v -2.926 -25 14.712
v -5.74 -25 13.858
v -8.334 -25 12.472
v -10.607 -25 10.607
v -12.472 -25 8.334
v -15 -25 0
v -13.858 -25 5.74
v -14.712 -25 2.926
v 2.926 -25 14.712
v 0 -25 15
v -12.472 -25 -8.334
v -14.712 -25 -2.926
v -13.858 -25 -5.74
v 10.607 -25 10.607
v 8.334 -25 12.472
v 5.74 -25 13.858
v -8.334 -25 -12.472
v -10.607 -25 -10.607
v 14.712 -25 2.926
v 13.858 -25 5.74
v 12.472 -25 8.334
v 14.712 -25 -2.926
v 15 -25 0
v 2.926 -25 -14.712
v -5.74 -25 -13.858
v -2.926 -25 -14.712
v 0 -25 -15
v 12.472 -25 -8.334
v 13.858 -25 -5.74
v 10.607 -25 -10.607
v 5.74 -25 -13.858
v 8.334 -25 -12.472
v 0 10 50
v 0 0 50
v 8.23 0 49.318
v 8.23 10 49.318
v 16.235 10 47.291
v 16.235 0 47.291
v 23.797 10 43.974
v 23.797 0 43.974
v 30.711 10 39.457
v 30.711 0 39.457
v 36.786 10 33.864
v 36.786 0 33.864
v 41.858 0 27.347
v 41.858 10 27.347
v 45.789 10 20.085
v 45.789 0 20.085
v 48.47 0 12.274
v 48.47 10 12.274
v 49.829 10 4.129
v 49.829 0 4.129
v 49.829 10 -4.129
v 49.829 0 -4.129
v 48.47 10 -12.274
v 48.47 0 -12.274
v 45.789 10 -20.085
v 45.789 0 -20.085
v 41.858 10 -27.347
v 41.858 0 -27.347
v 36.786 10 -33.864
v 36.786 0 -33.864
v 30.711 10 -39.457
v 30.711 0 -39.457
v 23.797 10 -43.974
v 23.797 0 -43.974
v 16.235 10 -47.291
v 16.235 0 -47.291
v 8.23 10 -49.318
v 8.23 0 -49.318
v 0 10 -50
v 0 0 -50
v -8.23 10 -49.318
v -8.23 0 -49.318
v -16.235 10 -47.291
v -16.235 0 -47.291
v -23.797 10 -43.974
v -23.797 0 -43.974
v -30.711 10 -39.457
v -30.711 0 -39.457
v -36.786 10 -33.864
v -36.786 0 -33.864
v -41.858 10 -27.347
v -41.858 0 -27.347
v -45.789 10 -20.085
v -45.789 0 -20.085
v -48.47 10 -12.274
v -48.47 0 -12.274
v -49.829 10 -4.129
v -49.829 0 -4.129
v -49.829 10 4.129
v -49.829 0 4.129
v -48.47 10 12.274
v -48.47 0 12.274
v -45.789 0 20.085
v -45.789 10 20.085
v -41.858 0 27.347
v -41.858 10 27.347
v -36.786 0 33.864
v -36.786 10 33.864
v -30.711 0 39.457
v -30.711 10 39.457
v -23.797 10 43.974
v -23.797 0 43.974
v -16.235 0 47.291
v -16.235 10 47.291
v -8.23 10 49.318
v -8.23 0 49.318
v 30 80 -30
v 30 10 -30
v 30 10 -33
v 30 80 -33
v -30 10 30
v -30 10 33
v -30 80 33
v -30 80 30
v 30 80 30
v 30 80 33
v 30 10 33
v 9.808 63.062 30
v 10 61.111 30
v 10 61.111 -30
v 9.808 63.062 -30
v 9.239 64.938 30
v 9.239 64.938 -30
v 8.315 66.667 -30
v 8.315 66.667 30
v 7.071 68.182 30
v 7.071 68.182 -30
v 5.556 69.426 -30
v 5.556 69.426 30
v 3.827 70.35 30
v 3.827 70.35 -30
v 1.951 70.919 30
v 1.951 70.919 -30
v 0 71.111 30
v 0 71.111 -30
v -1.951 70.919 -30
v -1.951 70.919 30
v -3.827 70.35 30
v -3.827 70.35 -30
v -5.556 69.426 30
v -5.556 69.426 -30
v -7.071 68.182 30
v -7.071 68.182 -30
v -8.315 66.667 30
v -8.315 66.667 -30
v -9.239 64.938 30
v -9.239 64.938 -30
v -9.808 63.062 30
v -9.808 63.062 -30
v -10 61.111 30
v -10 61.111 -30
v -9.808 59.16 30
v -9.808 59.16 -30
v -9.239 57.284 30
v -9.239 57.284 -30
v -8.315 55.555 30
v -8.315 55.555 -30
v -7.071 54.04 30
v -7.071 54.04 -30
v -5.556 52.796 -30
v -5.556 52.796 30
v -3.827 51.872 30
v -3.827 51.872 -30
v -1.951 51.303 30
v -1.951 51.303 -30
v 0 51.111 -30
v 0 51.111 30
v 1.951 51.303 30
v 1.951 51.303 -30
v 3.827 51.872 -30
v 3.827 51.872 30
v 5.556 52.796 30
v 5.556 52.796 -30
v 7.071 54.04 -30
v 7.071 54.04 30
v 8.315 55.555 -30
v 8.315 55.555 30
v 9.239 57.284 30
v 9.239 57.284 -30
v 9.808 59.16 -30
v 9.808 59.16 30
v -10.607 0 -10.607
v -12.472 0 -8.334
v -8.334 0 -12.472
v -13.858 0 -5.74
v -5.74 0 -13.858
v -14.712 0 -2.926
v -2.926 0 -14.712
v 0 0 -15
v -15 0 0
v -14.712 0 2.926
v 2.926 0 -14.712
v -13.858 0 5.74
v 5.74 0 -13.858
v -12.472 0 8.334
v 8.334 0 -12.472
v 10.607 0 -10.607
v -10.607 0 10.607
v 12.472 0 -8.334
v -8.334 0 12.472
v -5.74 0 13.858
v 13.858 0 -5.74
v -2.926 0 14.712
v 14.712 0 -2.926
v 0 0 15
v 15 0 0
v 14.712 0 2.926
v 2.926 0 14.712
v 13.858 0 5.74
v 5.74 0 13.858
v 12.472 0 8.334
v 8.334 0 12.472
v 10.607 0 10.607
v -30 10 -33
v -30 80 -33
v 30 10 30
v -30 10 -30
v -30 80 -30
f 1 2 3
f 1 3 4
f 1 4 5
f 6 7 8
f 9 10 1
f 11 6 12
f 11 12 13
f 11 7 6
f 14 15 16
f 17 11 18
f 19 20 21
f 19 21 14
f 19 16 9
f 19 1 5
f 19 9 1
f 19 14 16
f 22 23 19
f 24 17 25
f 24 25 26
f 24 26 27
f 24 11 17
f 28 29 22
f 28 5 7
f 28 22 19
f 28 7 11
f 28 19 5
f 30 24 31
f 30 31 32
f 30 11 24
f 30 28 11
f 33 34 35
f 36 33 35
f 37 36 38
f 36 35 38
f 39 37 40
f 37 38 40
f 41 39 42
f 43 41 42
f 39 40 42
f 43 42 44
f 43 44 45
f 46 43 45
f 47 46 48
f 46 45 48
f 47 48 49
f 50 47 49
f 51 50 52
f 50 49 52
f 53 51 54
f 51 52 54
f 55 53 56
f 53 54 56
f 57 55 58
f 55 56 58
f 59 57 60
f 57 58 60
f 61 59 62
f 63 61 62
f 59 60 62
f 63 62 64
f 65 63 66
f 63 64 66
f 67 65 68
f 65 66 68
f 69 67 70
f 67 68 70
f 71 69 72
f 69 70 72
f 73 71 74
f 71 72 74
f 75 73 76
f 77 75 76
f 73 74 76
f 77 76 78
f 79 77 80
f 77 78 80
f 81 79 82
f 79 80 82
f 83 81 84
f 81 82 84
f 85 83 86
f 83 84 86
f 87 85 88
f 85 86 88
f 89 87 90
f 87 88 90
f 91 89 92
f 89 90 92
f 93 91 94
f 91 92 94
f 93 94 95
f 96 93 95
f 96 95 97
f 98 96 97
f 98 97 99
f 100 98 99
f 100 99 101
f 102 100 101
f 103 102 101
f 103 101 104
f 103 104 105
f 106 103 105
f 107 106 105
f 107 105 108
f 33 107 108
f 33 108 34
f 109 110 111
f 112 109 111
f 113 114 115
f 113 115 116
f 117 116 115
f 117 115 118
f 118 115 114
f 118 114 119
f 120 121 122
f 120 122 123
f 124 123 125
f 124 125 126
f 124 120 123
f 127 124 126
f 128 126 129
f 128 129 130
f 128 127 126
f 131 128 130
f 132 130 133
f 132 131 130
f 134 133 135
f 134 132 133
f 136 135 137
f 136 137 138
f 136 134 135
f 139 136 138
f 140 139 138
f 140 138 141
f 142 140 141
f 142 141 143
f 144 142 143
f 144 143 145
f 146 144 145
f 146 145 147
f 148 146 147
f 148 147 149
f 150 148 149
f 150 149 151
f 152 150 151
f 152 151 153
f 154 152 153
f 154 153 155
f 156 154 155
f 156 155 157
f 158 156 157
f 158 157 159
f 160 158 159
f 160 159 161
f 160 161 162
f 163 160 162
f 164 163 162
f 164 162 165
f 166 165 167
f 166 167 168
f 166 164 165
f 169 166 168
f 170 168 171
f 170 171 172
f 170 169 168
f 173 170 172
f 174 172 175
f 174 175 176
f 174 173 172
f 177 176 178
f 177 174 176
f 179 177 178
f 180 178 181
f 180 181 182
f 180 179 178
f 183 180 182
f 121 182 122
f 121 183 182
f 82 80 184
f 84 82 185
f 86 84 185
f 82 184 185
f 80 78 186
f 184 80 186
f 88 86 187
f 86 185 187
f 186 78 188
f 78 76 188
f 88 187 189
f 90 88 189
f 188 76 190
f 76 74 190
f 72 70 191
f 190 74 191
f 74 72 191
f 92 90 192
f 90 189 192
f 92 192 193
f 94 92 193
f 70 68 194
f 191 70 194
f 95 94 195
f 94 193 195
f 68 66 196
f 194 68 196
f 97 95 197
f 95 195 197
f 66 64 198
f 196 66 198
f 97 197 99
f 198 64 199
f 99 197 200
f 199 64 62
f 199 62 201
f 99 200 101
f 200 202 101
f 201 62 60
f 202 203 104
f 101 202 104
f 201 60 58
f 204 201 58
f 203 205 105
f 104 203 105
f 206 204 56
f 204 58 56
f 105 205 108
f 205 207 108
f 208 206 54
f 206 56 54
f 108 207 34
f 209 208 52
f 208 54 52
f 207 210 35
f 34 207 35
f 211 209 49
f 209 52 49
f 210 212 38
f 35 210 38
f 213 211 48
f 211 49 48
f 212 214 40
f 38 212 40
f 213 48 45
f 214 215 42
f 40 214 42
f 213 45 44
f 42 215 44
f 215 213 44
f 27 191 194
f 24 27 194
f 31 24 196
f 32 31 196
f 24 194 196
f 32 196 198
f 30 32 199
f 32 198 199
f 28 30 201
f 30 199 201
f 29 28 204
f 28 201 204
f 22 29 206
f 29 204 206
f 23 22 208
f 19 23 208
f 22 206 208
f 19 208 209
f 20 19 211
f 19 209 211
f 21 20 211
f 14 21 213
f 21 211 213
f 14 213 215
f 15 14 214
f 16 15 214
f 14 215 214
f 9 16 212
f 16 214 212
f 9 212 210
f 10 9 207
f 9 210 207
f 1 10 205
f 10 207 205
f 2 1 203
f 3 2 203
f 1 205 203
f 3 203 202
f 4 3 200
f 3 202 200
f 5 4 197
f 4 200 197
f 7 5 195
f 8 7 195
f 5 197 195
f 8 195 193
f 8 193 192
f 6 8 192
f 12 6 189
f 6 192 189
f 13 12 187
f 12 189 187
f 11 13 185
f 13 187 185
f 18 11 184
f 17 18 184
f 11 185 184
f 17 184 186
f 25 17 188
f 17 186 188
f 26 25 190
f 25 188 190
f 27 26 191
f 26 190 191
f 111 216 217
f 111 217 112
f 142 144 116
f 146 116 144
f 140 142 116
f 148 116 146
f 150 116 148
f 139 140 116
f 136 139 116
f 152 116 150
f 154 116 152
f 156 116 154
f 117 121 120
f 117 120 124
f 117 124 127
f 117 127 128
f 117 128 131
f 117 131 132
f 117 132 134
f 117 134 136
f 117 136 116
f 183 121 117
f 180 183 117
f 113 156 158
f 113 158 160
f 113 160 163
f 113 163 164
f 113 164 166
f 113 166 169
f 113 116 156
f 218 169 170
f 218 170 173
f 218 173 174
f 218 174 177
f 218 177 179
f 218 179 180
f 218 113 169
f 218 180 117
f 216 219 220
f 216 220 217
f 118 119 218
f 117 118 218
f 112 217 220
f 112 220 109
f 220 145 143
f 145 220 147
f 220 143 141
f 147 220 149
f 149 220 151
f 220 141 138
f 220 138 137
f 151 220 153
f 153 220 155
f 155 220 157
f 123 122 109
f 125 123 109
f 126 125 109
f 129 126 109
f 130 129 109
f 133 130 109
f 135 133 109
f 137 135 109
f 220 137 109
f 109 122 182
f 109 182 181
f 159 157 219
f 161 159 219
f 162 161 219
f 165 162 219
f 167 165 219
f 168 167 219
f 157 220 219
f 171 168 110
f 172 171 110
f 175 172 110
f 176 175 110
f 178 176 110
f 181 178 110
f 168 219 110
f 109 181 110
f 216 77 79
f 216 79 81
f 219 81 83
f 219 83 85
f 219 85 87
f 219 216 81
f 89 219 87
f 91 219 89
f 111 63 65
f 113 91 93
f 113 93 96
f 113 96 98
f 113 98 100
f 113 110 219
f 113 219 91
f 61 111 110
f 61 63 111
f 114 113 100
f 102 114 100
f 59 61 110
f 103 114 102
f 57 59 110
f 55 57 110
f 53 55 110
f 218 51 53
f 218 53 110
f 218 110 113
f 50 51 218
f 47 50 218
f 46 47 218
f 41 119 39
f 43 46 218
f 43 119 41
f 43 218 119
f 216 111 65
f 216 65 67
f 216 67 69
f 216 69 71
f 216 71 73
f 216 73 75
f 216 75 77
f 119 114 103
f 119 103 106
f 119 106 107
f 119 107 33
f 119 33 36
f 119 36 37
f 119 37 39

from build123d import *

# Parameters (mm, degrees)
SKETCH1_R           = 50
BOSS_EXTRUDE1_DEPTH = 10
SKETCH2_R           = 15
BOSS_EXTRUDE2_DEPTH = 25
SKETCH3_W           = 60
SKETCH3_H           = 3
BOSS_EXTRUDE3_DEPTH = 70
SKETCH4_R           = 10
BOSS_EXTRUDE4_DEPTH = 63


with BuildPart() as part:
    # Sketch1 → Boss-Extrude1 (new body)
    with BuildSketch(Plane(origin=(0, 0, 0), x_dir=(1, 0, 0), z_dir=(0, 1, 0))):
        with Locations(Location((0, 0, 0), (0, 0, 270))):
            Circle(SKETCH1_R)
    extrude(amount=BOSS_EXTRUDE1_DEPTH)

    # Sketch2 → Boss-Extrude2 (add)
    with BuildSketch(Plane(origin=(0, 0, 0), x_dir=(-1, 0, 0), z_dir=(0, -1, 0))):
        with Locations(Location((0, 0, 0), (0, 0, 90))):
            Circle(SKETCH2_R)
    extrude(amount=BOSS_EXTRUDE2_DEPTH)

    # Sketch3 → Boss-Extrude3 (add)
    with BuildSketch(Plane(origin=(0, 10, 0), x_dir=(1, 0, 0), z_dir=(0, 1, 0))):
        with Locations((0, -31.5)):
            Rectangle(SKETCH3_W, SKETCH3_H)
        with Locations((0, 31.5)):
            Rectangle(SKETCH3_W, SKETCH3_H)
    extrude(amount=BOSS_EXTRUDE3_DEPTH)

    # Sketch4 → Boss-Extrude4 (add)
    with BuildSketch(Plane.XY.offset(33)):
        with Locations((0, 61.110810205)):
            Circle(SKETCH4_R)
    extrude(amount=-BOSS_EXTRUDE4_DEPTH)


solid = part.part
